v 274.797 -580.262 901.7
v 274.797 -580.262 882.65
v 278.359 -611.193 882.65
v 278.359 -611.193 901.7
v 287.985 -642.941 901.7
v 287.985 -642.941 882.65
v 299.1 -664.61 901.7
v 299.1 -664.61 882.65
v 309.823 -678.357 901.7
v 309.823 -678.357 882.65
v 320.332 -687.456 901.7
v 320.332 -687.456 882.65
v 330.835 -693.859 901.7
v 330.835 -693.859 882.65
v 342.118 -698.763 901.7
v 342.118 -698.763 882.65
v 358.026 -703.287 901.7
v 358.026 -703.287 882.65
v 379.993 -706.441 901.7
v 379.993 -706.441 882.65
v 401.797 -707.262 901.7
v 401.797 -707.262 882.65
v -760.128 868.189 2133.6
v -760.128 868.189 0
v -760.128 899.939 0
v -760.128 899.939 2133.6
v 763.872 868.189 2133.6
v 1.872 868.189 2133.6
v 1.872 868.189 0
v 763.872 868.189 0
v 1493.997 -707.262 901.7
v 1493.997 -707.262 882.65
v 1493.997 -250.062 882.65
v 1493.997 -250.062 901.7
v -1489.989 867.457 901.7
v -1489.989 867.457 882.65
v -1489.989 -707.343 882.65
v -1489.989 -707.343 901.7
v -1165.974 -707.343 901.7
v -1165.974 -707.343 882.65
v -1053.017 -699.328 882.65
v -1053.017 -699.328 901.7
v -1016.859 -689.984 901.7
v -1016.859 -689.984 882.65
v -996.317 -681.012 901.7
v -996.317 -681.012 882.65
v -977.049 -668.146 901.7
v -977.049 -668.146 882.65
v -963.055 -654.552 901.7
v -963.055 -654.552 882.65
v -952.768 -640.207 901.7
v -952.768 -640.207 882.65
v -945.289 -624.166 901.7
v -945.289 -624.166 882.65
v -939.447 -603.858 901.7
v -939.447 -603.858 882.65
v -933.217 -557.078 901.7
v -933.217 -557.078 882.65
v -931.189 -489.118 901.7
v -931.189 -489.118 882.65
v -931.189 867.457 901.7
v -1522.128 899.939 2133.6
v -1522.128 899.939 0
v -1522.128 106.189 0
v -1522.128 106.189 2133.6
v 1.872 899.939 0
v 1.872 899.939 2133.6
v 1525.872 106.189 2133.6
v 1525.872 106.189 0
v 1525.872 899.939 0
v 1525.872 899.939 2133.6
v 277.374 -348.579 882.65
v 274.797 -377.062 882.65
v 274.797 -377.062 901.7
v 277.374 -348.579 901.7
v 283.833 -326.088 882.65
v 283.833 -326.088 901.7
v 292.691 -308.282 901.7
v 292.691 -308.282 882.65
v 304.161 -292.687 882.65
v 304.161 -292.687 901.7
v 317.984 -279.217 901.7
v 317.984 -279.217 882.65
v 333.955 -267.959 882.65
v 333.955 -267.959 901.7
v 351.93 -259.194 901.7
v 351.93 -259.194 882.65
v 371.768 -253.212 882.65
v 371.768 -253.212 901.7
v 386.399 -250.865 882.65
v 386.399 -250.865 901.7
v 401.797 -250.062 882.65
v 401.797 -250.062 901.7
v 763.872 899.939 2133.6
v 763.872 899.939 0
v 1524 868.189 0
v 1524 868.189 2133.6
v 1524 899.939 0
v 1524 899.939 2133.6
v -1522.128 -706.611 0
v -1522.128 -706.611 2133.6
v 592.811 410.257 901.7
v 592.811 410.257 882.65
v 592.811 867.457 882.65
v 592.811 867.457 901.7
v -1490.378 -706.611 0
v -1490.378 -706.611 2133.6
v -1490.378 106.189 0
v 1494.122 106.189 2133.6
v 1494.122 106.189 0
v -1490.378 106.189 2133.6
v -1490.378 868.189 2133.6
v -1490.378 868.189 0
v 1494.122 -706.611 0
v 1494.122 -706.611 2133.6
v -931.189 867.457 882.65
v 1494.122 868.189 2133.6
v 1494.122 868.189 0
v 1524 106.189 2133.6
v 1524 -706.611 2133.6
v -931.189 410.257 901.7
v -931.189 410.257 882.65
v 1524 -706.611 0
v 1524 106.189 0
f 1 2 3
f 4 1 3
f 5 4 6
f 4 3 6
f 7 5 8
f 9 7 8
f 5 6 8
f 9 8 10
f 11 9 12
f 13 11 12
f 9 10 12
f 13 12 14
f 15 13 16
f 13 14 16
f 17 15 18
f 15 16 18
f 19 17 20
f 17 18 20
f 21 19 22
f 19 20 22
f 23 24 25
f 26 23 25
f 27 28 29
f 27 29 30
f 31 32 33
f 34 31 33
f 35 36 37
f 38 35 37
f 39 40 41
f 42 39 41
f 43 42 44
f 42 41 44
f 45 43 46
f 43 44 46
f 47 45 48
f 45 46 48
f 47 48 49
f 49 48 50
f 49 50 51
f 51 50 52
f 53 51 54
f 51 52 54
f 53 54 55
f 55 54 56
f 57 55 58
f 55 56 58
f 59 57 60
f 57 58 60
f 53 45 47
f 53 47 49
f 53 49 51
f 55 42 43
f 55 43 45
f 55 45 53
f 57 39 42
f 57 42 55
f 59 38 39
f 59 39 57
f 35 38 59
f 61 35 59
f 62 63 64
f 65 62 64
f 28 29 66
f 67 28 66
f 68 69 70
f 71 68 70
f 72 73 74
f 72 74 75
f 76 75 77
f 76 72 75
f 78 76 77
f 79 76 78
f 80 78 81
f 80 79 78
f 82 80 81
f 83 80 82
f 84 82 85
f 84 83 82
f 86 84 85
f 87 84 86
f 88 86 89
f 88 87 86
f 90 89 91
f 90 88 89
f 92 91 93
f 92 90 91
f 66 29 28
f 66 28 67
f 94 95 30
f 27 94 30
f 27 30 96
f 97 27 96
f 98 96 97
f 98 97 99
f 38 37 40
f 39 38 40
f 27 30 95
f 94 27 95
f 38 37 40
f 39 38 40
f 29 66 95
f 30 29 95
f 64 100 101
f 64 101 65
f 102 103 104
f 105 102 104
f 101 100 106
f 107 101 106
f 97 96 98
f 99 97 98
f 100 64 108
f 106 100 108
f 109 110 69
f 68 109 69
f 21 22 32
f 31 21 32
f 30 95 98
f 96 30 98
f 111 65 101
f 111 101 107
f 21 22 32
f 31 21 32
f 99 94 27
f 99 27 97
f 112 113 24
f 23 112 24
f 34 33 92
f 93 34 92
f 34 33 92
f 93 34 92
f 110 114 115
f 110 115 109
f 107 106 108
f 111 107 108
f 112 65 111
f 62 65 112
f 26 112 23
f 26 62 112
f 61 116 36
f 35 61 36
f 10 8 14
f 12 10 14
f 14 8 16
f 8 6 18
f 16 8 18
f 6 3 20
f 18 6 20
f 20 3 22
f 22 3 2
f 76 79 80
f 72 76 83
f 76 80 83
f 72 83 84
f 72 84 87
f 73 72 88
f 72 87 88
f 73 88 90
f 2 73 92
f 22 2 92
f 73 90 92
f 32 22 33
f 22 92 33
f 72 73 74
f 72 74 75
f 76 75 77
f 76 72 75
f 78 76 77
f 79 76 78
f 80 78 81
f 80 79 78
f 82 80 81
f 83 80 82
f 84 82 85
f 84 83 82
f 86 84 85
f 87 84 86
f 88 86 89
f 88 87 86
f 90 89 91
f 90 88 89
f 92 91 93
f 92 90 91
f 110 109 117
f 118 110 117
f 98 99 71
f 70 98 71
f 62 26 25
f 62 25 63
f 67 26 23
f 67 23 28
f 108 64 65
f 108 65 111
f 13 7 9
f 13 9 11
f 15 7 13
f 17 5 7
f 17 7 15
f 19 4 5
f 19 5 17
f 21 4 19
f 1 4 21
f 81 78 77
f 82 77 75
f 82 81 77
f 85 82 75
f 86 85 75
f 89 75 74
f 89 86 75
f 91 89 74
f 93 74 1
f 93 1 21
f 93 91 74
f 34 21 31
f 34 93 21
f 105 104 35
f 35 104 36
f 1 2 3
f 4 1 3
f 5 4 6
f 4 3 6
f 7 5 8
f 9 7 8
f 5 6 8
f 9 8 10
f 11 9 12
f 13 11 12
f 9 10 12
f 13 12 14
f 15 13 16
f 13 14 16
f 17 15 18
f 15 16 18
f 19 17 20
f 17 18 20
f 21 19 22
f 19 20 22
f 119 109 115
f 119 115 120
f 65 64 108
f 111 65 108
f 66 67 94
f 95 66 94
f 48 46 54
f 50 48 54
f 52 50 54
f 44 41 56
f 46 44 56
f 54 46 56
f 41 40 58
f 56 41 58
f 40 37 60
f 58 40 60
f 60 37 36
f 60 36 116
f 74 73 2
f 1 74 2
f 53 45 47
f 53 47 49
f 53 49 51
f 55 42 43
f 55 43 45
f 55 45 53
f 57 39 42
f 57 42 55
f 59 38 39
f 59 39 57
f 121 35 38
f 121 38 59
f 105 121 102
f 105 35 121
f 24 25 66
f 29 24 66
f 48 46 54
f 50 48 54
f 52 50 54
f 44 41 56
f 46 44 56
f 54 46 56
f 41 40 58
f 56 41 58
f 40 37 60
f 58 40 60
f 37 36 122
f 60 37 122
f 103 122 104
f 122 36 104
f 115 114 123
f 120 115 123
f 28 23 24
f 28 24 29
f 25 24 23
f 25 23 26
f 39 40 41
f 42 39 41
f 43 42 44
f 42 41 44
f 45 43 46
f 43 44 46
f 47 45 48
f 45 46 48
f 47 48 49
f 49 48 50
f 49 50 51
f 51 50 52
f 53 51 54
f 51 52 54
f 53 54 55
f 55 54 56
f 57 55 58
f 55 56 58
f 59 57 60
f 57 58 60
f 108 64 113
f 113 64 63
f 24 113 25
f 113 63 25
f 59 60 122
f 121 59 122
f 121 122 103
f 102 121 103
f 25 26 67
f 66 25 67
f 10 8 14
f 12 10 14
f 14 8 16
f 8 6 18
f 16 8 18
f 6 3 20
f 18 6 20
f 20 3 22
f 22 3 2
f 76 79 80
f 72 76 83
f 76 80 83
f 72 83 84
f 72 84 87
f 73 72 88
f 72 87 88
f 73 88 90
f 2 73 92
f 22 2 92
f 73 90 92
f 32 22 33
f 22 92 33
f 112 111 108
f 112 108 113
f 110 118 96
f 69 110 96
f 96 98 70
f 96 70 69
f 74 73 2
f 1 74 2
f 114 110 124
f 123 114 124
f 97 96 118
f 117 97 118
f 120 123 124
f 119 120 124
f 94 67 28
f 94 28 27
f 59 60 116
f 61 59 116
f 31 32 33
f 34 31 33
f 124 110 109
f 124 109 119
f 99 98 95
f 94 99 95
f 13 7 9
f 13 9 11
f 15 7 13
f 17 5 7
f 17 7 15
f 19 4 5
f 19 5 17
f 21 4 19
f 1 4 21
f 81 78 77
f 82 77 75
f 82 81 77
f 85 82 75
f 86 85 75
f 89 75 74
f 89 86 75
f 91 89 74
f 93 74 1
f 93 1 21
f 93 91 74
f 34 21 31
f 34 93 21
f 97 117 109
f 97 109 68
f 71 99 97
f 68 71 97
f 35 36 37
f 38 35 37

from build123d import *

# Parameters (mm, degrees)
F1_W      = 31.75
F1_H      = 812.8
F2_DEPTH  = 2133.6
F1_H_2    = 762
F3_DEPTH  = 2133.6
F4_DEPTH  = 2133.6
F1_W_2    = 762
F1_H_3    = 31.75
F5_DEPTH  = 2133.6
F6_DEPTH  = 2133.6
F7_DEPTH  = 2133.6
F1_W_3    = 1.8724908829
F1_W_4    = 29.8775091171
F8_DEPTH  = 2133.6
F9_DEPTH  = 2133.6
F12_DEPTH = 19.05
F13_DEPTH = 19.05
F14_DEPTH = 19.05
F11_W     = 1524
F11_H     = 457.2


with BuildPart() as f2:
    # F1 (on face) → F2 (new body)
    with BuildSketch(Plane.XY):
        with Locations((-1506.2525091171, -300.2106396675)):
            Rectangle(F1_W, F1_H)
    extrude(amount=F2_DEPTH)


with BuildPart() as f3:
    # F1 (on face) → F3 (new body)
    with BuildSketch(Plane.XY):
        with Locations((-1506.2525091171, 487.1893603325)):
            Rectangle(F1_W, F1_H_2)
    extrude(amount=F3_DEPTH)

    # F1 (on face) → F4 (join)
    with BuildSketch(Plane.XY):
        Polygon((-1522.1275091171, 899.9393603325), (-1522.1275091171, 868.1893603325), (-1490.3775091171, 868.1893603325), (-760.1275091171, 868.1893603325), (-760.1275091171, 899.9393603325), align=None)
    extrude(amount=F4_DEPTH)


with BuildPart() as f5:
    # F1 (on face) → F5 (new body)
    with BuildSketch(Plane.XY):
        with Locations((-379.1275091171, 884.0643603325)):
            Rectangle(F1_W_2, F1_H_3)
    extrude(amount=F5_DEPTH)


with BuildPart() as f6:
    # F1 (on face) → F6 (new body)
    with BuildSketch(Plane.XY):
        with Locations((382.8724908829, 884.0643603325)):
            Rectangle(F1_W_2, F1_H_3)
    extrude(amount=F6_DEPTH)


with BuildPart() as f7:
    # F1 (on face) → F7 (new body)
    with BuildSketch(Plane.XY):
        Polygon((763.8724908829, 899.9393603325), (763.8724908829, 868.1893603325), (1494.1224908829, 868.1893603325), (1524, 868.1893603325), (1524, 899.9393603325), align=None)
    extrude(amount=F7_DEPTH)


with BuildPart() as f8:
    # F1 (on face) → F8 (new body)
    with BuildSketch(Plane.XY):
        with Locations((1524.9362454414, 487.1893603325)):
            Rectangle(F1_W_3, F1_H_2)
        with Locations((1509.0612454414, 487.1893603325)):
            Rectangle(F1_W_4, F1_H_2)
        with Locations((1524.9362454414, 884.0643603325)):
            Rectangle(F1_W_3, F1_H_3)
    extrude(amount=F8_DEPTH)


with BuildPart() as f9:
    # F1 (on face) → F9 (new body)
    with BuildSketch(Plane.XY):
        with Locations((1509.0612454414, -300.2106396675)):
            Rectangle(F1_W_4, F1_H)
    extrude(amount=F9_DEPTH)


with BuildPart() as f12:
    # F11 (on offset) → F12 (new body)
    with BuildSketch(Plane.XY.offset(882.65)):
        with BuildLine():
            Line((-931.1889594966, 867.4574278822), (-1489.9889594966, 867.4574278822))
            Line((-1489.9889594966, 867.4574278822), (-1489.9889594966, -707.3425721178))
            Line((-1489.9889594966, -707.3425721178), (-1165.974074322, -707.3425721178))
            add(Edge.make_bspline(
                [(-1165.974074322, -707.3425721178), (-1041.381843423, -707.3425721178), (-955.387579272, -670.8314552719), (-931.1889594966, -601.6234620314), (-931.1889594966, -489.1179713462)],
                knots=[0, 0, 0, 0, 0.5176974358, 1, 1, 1, 1], degree=3))
            Line((-931.1889594966, -489.1179713462), (-931.1889594966, 410.2574278822))
            Line((-931.1889594966, 410.2574278822), (-931.1889594966, 867.4574278822))
        make_face()
    extrude(amount=F12_DEPTH)


with BuildPart() as f13:
    # F11 (on offset) → F13 (new body)
    with BuildSketch(Plane.XY.offset(882.65)):
        with BuildLine():
            Line((401.797164918, -707.2619415293), (1493.997164918, -707.2619415293))
            Line((1493.997164918, -707.2619415293), (1493.997164918, -250.0619415293))
            Line((1493.997164918, -250.0619415293), (401.797164918, -250.0619415293))
            add(Edge.make_bspline(
                [(274.797164918, -377.0619415293), (274.797164918, -337.0280400353), (302.3876745849, -277.2630470423), (364.7807500246, -250.0619415293), (401.797164918, -250.0619415293)],
                knots=[0, 0, 0, 0, 0.5022196998, 1, 1, 1, 1], degree=3))
            Line((274.797164918, -377.0619415293), (274.797164918, -580.2619415293))
            add(Edge.make_bspline(
                [(274.797164918, -580.2619415293), (274.797164918, -606.7072252194), (296.0167942373, -698.4288133945), (369.9714603839, -707.2619415293), (401.797164918, -707.2619415293)],
                knots=[0, 0, 0, 0, 0.5110702398, 1, 1, 1, 1], degree=3))
        make_face()
    extrude(amount=F13_DEPTH)


with BuildPart() as f14:
    # F11 (on offset) → F14 (new body)
    with BuildSketch(Plane.XY.offset(882.65)):
        with BuildLine():
            Line((401.797164918, -707.2619415293), (1493.997164918, -707.2619415293))
            Line((1493.997164918, -707.2619415293), (1493.997164918, -250.0619415293))
            Line((1493.997164918, -250.0619415293), (401.797164918, -250.0619415293))
            add(Edge.make_bspline(
                [(274.797164918, -377.0619415293), (274.797164918, -337.0280400353), (302.3876745849, -277.2630470423), (364.7807500246, -250.0619415293), (401.797164918, -250.0619415293)],
                knots=[0, 0, 0, 0, 0.5022196998, 1, 1, 1, 1], degree=3))
            Line((274.797164918, -377.0619415293), (274.797164918, -580.2619415293))
            add(Edge.make_bspline(
                [(274.797164918, -580.2619415293), (274.797164918, -606.7072252194), (296.0167942373, -698.4288133945), (369.9714603839, -707.2619415293), (401.797164918, -707.2619415293)],
                knots=[0, 0, 0, 0, 0.5110702398, 1, 1, 1, 1], degree=3))
        make_face()
    extrude(amount=F14_DEPTH)


with BuildPart() as f14b:
    # F11 (on offset) → F14, piece 2 (new body)
    with BuildSketch(Plane.XY.offset(882.65)):
        with BuildLine():
            Line((-931.1889594966, 867.4574278822), (-1489.9889594966, 867.4574278822))
            Line((-1489.9889594966, 867.4574278822), (-1489.9889594966, -707.3425721178))
            Line((-1489.9889594966, -707.3425721178), (-1165.974074322, -707.3425721178))
            add(Edge.make_bspline(
                [(-1165.974074322, -707.3425721178), (-1041.381843423, -707.3425721178), (-955.387579272, -670.8314552719), (-931.1889594966, -601.6234620314), (-931.1889594966, -489.1179713462)],
                knots=[0, 0, 0, 0, 0.5176974358, 1, 1, 1, 1], degree=3))
            Line((-931.1889594966, -489.1179713462), (-931.1889594966, 410.2574278822))
            Line((-931.1889594966, 410.2574278822), (-931.1889594966, 867.4574278822))
        make_face()
        with Locations((-169.1889594966, 638.8574278822)):
            Rectangle(F11_W, F11_H)
    extrude(amount=F14_DEPTH)


solid = Compound([f2.part, f3.part, f5.part, f6.part, f7.part, f8.part, f9.part, f12.part, f13.part, f14.part, f14b.part])
